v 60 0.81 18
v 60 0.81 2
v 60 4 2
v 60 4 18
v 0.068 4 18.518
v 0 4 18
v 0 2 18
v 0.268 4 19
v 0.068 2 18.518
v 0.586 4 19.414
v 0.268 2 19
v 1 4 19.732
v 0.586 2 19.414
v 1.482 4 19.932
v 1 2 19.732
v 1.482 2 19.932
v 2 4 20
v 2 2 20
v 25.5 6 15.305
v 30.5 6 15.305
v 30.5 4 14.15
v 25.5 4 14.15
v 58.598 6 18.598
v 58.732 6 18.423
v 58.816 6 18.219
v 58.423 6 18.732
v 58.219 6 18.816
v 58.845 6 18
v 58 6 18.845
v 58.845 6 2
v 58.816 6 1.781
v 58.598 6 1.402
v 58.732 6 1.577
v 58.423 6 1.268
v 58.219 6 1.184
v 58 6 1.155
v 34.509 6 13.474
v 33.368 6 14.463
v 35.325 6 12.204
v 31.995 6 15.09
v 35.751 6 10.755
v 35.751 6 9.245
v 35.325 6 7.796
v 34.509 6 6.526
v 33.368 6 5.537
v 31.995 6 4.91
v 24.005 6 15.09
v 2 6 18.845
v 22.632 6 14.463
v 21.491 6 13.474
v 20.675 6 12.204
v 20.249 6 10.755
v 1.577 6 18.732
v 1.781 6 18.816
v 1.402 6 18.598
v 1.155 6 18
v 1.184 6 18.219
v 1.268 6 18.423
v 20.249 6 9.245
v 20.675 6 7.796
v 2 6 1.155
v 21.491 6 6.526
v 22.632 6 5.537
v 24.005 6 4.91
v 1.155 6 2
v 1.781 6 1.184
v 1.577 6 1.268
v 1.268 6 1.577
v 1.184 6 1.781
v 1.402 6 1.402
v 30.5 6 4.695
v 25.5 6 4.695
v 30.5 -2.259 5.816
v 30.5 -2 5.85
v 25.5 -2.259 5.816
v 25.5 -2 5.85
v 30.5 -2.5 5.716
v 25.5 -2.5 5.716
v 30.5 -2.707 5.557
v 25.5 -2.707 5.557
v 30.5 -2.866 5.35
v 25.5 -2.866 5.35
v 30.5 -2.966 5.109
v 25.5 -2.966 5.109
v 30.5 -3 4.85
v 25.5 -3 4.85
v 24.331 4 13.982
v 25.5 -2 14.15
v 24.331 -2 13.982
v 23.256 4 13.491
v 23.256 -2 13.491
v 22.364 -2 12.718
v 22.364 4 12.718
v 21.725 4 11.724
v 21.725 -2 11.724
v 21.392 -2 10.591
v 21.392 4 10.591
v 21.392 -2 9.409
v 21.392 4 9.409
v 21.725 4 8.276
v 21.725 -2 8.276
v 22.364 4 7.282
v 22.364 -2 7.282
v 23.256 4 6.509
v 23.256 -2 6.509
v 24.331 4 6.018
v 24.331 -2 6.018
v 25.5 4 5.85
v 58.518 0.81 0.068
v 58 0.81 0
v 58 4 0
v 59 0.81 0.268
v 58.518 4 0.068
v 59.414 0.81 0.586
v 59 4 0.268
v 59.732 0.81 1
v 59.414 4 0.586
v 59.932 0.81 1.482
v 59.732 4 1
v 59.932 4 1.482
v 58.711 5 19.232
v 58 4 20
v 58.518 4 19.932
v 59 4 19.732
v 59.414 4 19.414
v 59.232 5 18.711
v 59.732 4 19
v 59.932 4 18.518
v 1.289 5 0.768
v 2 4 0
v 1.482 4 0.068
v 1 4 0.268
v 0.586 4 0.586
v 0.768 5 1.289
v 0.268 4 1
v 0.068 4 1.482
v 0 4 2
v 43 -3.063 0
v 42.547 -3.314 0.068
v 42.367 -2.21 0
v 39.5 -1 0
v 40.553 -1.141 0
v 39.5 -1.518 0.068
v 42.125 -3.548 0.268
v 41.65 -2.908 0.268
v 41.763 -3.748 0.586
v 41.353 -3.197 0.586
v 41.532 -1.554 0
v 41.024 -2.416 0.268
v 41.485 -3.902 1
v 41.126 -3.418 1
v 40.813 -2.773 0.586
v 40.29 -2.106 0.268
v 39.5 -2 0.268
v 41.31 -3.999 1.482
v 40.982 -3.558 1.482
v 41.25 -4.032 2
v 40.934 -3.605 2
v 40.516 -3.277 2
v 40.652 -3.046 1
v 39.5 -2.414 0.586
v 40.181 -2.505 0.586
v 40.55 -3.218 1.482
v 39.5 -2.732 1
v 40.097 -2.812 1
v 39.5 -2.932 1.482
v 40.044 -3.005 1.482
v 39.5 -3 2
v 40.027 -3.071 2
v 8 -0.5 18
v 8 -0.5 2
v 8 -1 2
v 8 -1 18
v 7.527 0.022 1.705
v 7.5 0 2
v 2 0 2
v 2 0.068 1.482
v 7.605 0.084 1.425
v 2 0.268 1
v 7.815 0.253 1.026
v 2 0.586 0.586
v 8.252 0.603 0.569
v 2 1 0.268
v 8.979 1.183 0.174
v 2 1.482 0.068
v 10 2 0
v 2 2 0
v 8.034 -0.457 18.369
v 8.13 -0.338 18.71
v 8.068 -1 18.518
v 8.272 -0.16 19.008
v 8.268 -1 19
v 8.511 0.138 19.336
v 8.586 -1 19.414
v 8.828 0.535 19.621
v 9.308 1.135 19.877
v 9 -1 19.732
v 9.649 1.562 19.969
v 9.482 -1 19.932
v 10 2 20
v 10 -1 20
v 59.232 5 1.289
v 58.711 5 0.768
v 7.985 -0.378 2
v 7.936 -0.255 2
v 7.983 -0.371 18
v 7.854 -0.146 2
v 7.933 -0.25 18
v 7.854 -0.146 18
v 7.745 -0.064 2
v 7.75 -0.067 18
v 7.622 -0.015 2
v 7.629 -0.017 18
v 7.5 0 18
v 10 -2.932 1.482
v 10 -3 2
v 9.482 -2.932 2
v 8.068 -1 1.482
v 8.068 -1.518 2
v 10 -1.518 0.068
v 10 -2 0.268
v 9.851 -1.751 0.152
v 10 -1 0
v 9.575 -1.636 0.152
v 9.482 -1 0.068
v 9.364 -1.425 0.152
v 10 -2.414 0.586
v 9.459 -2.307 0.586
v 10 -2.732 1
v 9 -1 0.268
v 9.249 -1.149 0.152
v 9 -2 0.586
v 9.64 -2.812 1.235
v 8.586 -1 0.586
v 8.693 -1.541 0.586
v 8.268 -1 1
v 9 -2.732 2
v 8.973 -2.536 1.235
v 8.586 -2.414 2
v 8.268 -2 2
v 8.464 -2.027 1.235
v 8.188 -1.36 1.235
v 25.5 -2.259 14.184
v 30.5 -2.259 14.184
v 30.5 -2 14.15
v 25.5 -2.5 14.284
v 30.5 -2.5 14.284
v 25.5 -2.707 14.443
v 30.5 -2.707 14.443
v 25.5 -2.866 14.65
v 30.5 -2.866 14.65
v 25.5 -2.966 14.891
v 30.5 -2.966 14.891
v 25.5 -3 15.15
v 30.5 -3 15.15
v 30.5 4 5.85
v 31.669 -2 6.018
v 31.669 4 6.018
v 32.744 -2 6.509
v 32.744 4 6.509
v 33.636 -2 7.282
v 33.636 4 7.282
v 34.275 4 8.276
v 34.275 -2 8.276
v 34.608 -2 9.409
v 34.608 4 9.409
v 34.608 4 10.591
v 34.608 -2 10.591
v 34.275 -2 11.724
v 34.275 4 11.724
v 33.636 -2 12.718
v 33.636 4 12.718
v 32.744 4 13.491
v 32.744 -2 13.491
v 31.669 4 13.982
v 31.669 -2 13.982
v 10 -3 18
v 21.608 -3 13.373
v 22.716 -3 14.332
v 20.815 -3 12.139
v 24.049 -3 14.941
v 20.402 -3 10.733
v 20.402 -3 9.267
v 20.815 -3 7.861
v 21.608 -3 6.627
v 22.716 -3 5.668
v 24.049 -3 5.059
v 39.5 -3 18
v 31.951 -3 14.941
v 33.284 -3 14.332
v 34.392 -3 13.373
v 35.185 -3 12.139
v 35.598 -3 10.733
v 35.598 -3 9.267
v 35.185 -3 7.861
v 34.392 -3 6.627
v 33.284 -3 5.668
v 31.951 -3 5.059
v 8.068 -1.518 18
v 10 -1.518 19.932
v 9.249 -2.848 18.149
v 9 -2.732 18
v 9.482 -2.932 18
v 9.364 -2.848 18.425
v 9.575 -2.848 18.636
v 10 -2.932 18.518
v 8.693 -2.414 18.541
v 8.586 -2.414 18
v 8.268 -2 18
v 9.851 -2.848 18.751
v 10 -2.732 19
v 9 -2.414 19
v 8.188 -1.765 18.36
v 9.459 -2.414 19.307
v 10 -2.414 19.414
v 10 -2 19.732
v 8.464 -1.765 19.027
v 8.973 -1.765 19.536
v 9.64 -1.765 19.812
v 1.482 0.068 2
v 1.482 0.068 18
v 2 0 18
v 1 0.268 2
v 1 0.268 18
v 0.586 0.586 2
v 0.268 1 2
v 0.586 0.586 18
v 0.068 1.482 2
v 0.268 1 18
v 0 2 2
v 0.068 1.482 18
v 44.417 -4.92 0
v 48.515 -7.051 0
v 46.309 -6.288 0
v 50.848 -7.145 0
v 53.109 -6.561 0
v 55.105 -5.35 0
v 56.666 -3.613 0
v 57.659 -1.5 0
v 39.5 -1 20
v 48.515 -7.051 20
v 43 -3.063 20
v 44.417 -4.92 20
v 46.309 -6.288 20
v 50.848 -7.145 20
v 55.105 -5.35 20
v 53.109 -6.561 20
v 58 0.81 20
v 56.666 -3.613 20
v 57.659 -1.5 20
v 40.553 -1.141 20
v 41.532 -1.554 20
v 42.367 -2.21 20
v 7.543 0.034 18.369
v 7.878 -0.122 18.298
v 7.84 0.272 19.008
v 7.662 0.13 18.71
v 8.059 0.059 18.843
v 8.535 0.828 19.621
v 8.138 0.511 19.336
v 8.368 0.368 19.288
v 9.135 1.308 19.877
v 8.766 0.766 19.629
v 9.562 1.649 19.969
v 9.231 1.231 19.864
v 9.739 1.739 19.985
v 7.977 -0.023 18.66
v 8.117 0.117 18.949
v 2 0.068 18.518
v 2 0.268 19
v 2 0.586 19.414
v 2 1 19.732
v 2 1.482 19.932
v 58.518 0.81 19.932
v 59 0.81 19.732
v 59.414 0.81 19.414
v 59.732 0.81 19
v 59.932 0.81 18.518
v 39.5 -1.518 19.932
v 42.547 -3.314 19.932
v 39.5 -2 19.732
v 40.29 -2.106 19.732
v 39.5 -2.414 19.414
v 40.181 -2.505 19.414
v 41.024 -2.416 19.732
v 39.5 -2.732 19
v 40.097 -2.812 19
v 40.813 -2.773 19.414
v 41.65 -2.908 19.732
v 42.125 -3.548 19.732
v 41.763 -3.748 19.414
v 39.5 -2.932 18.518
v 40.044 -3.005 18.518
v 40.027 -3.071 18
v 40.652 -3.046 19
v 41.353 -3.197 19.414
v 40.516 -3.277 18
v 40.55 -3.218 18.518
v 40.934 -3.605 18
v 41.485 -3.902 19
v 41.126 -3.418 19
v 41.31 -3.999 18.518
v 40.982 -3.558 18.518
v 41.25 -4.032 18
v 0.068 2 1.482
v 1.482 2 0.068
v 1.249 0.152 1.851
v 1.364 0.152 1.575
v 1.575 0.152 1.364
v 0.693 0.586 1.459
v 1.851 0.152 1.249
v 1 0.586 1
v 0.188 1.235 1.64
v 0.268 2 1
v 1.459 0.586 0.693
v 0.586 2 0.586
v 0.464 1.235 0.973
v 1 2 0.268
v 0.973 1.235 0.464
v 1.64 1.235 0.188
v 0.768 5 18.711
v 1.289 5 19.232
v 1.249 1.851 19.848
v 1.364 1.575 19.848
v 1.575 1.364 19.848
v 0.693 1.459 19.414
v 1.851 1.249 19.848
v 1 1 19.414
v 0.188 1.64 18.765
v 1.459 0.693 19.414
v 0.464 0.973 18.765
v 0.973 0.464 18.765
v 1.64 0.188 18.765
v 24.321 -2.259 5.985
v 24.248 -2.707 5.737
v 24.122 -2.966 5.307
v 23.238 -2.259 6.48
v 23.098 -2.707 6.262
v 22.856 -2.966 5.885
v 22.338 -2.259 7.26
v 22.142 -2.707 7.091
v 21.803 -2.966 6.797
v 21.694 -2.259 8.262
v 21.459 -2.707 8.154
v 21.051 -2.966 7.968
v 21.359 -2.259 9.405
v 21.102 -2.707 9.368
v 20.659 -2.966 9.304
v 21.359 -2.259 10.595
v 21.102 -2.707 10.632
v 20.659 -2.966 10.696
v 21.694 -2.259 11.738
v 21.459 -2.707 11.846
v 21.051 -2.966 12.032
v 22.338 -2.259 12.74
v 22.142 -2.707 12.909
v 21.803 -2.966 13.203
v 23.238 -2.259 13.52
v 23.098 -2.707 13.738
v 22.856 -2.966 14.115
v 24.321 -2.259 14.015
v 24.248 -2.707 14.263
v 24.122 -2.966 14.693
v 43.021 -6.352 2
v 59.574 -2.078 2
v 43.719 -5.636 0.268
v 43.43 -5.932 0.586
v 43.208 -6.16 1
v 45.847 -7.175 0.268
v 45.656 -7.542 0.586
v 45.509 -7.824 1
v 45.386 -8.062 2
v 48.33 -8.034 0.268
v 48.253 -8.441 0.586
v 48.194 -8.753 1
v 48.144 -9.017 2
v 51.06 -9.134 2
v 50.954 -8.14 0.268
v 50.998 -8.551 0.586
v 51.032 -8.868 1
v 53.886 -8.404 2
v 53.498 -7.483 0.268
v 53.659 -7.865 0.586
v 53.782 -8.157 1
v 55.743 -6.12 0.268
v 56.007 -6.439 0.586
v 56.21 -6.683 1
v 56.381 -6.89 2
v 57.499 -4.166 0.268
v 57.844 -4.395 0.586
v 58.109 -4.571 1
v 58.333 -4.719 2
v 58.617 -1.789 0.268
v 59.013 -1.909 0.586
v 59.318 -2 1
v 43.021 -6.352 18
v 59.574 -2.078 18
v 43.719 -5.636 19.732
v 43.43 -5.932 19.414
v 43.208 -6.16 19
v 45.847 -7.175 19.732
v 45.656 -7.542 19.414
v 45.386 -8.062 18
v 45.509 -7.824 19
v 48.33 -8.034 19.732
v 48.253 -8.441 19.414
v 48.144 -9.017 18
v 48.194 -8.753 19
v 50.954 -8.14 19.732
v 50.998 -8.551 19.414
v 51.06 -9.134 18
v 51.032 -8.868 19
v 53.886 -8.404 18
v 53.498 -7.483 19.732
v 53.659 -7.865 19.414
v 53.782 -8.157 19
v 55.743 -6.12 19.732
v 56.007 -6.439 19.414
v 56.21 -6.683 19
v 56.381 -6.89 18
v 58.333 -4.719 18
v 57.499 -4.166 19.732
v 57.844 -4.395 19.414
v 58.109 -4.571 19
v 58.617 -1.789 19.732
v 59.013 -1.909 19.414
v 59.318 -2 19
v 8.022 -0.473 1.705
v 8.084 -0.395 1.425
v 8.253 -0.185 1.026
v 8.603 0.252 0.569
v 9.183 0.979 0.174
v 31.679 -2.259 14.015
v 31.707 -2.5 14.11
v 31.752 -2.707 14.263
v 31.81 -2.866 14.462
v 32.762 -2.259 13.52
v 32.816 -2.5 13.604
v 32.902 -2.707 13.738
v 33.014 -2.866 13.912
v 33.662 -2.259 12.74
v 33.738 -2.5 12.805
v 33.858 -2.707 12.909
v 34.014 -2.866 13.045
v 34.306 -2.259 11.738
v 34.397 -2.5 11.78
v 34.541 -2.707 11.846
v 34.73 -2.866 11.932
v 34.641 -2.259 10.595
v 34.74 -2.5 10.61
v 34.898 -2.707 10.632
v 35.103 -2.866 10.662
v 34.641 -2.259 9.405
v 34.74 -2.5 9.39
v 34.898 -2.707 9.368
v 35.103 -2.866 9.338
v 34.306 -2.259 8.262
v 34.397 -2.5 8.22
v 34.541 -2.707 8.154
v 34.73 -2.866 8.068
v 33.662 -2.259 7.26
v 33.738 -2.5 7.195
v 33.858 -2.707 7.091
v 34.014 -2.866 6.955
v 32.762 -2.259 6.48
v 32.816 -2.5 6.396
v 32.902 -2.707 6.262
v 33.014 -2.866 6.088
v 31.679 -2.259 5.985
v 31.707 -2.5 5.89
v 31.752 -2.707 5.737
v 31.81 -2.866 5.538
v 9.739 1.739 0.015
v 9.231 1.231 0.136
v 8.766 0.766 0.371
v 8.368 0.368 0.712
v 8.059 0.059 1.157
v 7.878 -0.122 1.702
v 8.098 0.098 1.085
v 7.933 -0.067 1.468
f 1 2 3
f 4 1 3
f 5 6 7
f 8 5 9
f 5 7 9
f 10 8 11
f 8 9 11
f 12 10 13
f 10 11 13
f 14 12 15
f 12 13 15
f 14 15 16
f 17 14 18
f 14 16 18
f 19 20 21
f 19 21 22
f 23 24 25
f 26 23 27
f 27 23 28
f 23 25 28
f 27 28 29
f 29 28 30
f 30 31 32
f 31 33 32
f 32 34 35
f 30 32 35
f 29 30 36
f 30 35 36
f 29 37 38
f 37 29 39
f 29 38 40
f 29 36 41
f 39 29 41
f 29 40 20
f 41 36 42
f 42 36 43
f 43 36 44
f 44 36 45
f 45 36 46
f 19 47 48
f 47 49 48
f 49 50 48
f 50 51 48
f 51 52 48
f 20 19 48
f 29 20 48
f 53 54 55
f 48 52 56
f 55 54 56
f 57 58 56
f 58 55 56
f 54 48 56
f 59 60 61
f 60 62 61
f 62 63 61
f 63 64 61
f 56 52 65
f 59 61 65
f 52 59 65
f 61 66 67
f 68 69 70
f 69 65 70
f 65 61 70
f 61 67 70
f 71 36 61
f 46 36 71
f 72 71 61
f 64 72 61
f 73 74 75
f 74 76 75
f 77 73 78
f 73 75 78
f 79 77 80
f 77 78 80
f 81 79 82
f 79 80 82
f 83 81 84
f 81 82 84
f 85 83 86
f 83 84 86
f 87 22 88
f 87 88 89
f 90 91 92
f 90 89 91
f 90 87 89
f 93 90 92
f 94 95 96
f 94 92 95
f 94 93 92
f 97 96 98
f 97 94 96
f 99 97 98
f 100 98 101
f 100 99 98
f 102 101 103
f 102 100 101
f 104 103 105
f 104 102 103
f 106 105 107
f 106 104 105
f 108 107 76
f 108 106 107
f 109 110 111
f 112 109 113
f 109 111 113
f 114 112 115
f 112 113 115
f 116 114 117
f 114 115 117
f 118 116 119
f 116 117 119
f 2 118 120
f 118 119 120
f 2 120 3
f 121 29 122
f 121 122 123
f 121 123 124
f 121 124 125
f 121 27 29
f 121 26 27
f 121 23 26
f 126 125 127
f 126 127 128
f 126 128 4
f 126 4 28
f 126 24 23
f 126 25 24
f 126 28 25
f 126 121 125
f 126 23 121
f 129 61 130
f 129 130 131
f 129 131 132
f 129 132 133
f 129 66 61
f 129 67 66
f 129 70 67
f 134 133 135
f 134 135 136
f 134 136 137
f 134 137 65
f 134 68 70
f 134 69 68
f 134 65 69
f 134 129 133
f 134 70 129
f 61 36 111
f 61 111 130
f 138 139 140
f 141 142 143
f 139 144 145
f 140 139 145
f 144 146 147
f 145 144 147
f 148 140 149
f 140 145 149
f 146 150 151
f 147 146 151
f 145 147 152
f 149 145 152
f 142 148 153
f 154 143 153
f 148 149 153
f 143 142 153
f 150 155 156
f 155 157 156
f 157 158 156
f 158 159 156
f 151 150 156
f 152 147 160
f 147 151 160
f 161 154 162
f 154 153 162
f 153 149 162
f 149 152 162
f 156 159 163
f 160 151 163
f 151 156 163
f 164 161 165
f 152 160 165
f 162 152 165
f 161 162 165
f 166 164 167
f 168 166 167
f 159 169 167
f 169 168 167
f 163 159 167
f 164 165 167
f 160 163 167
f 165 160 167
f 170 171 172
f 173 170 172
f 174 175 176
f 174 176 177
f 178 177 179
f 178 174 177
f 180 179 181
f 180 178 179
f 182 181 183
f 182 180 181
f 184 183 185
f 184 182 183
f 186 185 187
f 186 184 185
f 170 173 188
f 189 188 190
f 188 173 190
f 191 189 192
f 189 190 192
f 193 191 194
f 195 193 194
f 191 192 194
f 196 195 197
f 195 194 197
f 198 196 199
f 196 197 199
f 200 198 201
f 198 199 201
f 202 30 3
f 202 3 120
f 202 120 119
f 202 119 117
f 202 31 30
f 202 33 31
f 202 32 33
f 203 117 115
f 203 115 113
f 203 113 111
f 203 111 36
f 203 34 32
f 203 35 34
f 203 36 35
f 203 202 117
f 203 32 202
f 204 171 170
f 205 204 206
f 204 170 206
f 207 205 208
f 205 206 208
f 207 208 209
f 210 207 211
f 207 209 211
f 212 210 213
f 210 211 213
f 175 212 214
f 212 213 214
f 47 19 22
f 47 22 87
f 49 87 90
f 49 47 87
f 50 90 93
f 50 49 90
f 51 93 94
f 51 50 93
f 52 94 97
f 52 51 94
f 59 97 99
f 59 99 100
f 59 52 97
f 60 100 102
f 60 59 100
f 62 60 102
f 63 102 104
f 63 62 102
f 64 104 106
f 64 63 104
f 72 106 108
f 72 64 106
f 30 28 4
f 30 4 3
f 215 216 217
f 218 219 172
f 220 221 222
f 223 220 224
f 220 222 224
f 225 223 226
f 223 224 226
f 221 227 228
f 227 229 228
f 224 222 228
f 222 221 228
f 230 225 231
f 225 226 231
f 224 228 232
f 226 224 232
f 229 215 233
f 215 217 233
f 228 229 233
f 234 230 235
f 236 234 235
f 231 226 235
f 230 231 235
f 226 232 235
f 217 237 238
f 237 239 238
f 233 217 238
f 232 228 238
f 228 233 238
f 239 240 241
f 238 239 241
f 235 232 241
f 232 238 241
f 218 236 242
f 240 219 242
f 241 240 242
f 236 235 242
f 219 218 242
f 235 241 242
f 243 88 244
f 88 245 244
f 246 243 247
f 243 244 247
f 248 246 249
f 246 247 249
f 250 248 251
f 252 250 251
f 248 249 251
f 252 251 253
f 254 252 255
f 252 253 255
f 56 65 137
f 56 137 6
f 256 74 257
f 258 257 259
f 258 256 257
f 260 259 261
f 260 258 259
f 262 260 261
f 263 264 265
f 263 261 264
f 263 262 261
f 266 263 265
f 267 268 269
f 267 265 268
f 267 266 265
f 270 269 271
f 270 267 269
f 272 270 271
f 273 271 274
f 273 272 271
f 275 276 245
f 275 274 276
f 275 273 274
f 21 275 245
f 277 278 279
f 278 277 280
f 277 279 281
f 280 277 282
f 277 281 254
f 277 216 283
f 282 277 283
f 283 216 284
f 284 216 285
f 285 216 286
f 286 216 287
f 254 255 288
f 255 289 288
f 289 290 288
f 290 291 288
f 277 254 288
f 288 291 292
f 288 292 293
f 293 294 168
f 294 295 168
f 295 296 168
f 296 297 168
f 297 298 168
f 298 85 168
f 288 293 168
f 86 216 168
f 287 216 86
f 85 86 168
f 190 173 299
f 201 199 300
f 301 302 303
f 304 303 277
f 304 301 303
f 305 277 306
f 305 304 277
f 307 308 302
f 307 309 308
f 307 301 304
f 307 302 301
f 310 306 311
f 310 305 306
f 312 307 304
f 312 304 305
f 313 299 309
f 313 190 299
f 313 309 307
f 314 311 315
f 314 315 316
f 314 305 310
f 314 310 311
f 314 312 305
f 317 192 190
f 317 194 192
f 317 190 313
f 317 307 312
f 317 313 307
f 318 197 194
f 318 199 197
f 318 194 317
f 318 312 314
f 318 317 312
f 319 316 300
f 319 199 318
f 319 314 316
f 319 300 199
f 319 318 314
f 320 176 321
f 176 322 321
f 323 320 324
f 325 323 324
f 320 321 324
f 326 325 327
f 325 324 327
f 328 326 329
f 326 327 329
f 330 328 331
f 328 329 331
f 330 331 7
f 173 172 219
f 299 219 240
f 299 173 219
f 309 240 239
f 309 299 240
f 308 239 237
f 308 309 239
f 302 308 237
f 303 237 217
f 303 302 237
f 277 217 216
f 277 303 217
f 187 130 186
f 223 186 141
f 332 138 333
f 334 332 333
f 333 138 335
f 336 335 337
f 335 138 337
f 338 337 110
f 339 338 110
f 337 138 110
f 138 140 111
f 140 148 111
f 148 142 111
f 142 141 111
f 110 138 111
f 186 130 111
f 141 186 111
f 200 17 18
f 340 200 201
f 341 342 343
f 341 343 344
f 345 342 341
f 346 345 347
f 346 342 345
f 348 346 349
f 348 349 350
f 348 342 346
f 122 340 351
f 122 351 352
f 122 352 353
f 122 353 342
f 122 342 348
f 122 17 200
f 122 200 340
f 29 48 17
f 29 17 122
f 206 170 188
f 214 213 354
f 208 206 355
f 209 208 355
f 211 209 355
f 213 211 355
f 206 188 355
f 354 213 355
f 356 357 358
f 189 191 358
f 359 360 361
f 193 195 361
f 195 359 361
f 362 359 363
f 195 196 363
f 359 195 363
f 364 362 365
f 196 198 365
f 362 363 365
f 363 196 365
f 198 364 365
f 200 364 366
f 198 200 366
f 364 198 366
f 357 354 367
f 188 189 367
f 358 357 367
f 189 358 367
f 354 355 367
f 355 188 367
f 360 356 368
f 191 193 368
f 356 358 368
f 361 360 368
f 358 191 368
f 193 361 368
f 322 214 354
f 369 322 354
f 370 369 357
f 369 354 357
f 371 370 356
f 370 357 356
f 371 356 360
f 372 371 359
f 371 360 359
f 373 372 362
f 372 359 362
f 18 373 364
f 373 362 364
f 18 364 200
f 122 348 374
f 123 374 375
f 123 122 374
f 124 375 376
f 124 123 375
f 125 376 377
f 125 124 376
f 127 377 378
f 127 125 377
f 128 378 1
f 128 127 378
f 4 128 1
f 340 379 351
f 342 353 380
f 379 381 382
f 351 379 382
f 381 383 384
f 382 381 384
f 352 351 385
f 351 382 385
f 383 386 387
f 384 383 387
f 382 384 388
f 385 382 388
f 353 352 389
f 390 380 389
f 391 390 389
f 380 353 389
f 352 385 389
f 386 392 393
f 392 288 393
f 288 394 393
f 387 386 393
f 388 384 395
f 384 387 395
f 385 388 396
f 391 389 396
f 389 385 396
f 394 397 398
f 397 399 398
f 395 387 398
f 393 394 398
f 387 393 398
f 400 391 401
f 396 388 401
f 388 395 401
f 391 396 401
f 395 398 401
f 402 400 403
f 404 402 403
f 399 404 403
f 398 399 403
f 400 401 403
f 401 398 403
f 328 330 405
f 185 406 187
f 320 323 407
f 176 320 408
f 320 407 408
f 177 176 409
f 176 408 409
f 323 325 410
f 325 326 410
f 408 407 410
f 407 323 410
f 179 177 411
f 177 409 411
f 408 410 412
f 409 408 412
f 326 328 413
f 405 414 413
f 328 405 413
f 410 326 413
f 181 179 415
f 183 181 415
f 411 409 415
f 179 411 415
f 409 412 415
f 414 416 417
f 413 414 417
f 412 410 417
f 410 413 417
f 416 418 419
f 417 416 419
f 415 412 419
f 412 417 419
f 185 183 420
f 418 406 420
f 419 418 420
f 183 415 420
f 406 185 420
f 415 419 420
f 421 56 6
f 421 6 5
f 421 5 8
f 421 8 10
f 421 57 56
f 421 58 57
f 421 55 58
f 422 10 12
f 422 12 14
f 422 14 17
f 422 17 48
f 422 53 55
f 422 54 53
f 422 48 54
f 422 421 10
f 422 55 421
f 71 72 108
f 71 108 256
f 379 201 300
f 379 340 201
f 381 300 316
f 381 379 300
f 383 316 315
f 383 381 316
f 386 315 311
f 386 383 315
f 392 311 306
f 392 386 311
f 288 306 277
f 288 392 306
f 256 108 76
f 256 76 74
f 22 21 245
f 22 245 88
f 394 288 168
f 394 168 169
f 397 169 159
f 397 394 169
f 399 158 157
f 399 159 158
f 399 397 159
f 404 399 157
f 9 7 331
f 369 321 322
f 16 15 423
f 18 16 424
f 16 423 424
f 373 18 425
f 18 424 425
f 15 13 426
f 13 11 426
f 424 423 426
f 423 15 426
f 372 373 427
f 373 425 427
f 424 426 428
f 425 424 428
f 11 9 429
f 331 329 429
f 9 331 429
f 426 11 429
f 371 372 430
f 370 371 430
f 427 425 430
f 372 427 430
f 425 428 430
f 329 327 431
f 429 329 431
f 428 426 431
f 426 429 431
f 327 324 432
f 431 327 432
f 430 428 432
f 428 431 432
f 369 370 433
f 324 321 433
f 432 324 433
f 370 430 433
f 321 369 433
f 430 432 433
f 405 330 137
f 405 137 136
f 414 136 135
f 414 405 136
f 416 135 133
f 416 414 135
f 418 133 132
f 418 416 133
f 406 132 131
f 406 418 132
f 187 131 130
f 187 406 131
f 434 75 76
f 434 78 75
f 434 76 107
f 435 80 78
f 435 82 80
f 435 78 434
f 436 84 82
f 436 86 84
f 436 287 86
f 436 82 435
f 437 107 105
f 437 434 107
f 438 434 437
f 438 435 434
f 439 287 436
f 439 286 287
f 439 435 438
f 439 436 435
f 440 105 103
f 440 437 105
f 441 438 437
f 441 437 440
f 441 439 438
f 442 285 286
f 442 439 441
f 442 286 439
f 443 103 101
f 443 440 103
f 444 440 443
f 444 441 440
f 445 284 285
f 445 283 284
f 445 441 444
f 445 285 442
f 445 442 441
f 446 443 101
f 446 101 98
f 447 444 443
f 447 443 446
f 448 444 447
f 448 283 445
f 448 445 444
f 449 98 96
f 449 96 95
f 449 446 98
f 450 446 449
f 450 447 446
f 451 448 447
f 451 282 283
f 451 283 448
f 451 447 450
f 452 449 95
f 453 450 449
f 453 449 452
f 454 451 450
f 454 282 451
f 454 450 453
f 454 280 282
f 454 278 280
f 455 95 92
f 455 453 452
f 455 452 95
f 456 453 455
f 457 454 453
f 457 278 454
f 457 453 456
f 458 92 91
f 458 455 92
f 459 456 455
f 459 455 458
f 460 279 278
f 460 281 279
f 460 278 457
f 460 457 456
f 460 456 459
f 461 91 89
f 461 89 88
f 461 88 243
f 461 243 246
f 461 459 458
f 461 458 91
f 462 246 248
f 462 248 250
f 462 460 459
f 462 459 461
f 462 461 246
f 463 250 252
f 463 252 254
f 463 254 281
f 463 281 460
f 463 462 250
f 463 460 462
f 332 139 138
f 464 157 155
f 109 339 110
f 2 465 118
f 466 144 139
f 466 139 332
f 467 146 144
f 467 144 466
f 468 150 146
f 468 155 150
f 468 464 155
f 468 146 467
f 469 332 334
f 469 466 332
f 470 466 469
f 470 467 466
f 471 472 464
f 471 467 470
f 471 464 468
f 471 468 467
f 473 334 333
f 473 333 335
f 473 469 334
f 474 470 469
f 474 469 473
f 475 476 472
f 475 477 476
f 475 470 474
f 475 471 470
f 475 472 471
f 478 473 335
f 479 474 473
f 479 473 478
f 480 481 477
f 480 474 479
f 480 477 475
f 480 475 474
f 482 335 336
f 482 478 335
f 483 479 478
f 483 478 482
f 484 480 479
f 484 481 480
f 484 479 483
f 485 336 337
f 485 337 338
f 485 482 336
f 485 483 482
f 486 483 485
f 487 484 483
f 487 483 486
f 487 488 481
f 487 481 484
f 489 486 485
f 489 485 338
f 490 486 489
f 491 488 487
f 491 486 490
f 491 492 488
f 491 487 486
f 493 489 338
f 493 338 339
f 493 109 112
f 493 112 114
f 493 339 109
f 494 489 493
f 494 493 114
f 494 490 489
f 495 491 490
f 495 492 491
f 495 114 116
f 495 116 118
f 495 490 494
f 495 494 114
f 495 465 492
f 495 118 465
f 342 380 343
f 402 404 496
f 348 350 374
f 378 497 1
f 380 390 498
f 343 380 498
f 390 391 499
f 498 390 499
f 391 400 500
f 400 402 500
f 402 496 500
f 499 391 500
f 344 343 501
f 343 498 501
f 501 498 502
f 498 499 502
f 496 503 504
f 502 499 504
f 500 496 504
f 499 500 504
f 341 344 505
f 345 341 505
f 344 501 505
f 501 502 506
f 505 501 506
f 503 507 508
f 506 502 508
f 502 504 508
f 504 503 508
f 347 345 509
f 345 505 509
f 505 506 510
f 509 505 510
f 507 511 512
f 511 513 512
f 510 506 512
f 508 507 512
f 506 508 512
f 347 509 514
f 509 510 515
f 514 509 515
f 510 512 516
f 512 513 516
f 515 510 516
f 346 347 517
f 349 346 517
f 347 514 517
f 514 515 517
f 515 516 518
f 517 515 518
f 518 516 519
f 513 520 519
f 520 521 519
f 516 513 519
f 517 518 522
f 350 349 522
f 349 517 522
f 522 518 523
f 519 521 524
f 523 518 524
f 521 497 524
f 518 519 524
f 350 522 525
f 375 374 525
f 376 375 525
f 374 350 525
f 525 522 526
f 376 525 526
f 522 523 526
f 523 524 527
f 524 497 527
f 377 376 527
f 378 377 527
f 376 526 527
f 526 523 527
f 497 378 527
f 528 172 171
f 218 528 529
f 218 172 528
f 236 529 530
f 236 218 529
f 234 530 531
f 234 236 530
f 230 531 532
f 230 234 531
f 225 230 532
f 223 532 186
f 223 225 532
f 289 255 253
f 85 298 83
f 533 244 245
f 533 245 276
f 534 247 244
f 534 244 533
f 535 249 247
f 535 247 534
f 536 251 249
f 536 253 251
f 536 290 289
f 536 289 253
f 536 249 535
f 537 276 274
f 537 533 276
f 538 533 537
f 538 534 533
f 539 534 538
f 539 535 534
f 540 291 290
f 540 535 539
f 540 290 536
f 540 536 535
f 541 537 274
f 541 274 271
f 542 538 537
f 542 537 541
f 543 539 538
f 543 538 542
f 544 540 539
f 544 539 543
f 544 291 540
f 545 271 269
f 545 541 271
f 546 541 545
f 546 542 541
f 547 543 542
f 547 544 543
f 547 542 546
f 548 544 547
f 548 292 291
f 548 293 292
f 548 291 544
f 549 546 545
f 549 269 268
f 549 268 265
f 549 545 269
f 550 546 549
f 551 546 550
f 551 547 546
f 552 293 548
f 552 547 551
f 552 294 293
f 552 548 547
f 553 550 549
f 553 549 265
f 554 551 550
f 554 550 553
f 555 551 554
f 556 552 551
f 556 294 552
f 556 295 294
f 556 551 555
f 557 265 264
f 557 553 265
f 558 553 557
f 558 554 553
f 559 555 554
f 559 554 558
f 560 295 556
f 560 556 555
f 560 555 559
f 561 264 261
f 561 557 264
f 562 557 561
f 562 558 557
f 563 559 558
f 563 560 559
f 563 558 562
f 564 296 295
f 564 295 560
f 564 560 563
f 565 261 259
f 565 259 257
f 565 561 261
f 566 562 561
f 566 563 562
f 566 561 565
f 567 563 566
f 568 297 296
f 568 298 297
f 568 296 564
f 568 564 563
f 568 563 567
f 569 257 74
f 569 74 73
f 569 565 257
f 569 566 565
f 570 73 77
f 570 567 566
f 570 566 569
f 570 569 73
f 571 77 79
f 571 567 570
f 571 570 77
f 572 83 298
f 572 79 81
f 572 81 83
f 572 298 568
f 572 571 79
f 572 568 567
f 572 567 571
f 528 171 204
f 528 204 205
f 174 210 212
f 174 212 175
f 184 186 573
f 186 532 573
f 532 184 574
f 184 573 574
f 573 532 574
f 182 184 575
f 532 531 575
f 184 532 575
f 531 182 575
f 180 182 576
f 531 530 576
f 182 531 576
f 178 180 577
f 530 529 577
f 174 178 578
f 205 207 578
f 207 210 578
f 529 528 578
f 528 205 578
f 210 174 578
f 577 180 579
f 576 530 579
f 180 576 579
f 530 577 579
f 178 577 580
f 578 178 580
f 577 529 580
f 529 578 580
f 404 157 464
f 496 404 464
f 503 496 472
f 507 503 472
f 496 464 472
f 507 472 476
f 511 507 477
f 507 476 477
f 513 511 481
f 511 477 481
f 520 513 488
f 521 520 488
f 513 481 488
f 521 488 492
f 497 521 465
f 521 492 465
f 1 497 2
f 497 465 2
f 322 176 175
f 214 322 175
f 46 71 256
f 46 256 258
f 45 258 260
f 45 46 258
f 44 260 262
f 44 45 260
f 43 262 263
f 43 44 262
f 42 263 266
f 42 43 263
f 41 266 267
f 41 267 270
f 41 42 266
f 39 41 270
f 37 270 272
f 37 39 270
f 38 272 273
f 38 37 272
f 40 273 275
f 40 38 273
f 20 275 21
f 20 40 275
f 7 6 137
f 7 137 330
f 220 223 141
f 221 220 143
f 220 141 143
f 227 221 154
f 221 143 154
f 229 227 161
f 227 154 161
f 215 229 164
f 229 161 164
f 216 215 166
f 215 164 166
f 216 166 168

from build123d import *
from OCP.BRepFilletAPI import BRepFilletAPI_MakeChamfer

# Parameters (mm, degrees)
BOSS_EXTRUDE1_DEPTH = 20
CUT_EXTRUDE1_REACH  = 67.044
FILLET1_R           = 2
CHAMFER1_SIZE       = 2
CHAMFER1_SIZE2      = 1.154700538
CHAMFER2_SIZE       = 2
CHAMFER2_SIZE2      = 1.154700538
FILLET2_R           = 1
FILLET3_R           = 0.5


with BuildPart() as part:
    # Sketch1 → Boss-Extrude1 (new body)
    with BuildSketch(Plane.XY):
        with BuildLine():
            Line((0, 0), (8, 0))
            Line((8, 0), (8, -3))
            Line((8, -3), (40.754109963, -3))
            ThreePointArc((40.754109963, -3), (51.941790363, -9), (60, 0.809661064))
            Line((60, 0.809661064), (60, 6))
            Line((60, 6), (0, 6))
            Line((0, 6), (0, 0))
        make_face()
    extrude(amount=BOSS_EXTRUDE1_DEPTH)

    # Sketch2 → Cut-Extrude1 (cut, up to next)
    with BuildSketch(Plane(origin=(0, 6, 0), x_dir=(1, 0, 0), z_dir=(0, 1, 0)), mode=Mode.PRIVATE) as cut_extrude1_sk1:
        with BuildLine():
            Line((25.5, -5.85), (30.5, -5.85))
            ThreePointArc((30.5, -5.85), (34.65, -10), (30.5, -14.15))
            Line((30.5, -14.15), (25.5, -14.15))
            ThreePointArc((25.5, -14.15), (21.35, -10), (25.5, -5.85))
        make_face()
    cut_extrude1_tool1 = extrude(cut_extrude1_sk1.sketch, amount=-CUT_EXTRUDE1_REACH, mode=Mode.PRIVATE) & part.part
    add(cut_extrude1_tool1.solids().sort_by_distance((28, 6, 10))[0], mode=Mode.SUBTRACT)

    # Fillet1
    fillet1_edges = [part.edges().sort_by_distance(p)[0] for p in [
        (0, 3, 0),
        (8, -1.5, 20),
        (40.754109963, -3, 10),
        (8, -3, 10),
        (0, 0, 10),
        (24.377054981, -3, 20),
        (51.941790363, -9, 20),
        (60, 3.404830532, 20),
        (0, 3, 20),
        (60, 3.404830532, 0),
        (51.941790363, -9, 0),
        (24.377054981, -3, 0),
        (4, 0, 20),
        (8, -1.5, 0),
        (4, 0, 0),
    ]]
    fillet(fillet1_edges, radius=FILLET1_R)

    # Chamfer1: one chamfer whose edges measure the first distance from different faces: ONE call of the kernel's chamfer builder (chamfer() names one face for all edges)
    chamfer1_edges_1 = [part.edges().sort_by_distance(p)[0] for p in [
        (30, 6, 0),
    ]]
    chamfer1_side_1 = [part.faces().sort_by_distance(p)[0] for p in [
        (34.587898507, 1.608386823, 0),
    ]]
    chamfer1_edges_2 = [part.edges().sort_by_distance(p)[0] for p in [
        (30, 6, 20),
    ]]
    chamfer1_side_2 = [part.faces().sort_by_distance(p)[0] for p in [
        (34.587898507, 1.608386823, 20),
    ]]
    chamfer1_edges_3 = [part.edges().sort_by_distance(p)[0] for p in [
        (60, 6, 10),
    ]]
    chamfer1_side_3 = [part.faces().sort_by_distance(p)[0] for p in [
        (60, 3.404830532, 10),
    ]]
    chamfer1_edges_4 = [part.edges().sort_by_distance(p)[0] for p in [
        (0, 6, 10),
    ]]
    chamfer1_side_4 = [part.faces().sort_by_distance(p)[0] for p in [
        (0, 4, 10),
    ]]
    chamfer1_edges_5 = [part.edges().sort_by_distance(p)[0] for p in [
        (0.585786438, 6, 19.414213562),
    ]]
    chamfer1_side_5 = [part.faces().sort_by_distance(p)[0] for p in [
        (0.585786438, 4, 19.414213562),
    ]]
    chamfer1_edges_6 = [part.edges().sort_by_distance(p)[0] for p in [
        (0.585786438, 6, 0.585786438),
    ]]
    chamfer1_side_6 = [part.faces().sort_by_distance(p)[0] for p in [
        (0.585786438, 4, 0.585786438),
    ]]
    chamfer1_edges_7 = [part.edges().sort_by_distance(p)[0] for p in [
        (59.414213562, 6, 19.414213562),
    ]]
    chamfer1_side_7 = [part.faces().sort_by_distance(p)[0] for p in [
        (59.414213562, 3.404830532, 19.414213562),
    ]]
    chamfer1_edges_8 = [part.edges().sort_by_distance(p)[0] for p in [
        (59.414213562, 6, 0.585786438),
    ]]
    chamfer1_side_8 = [part.faces().sort_by_distance(p)[0] for p in [
        (59.414213562, 3.404830532, 0.585786438),
    ]]
    chamfer1 = BRepFilletAPI_MakeChamfer(part.part.solid().wrapped)
    for e in chamfer1_edges_1:
        chamfer1.Add(CHAMFER1_SIZE, CHAMFER1_SIZE2, e.wrapped, chamfer1_side_1[0].wrapped)  # the first distance lies on this face
    for e in chamfer1_edges_2:
        chamfer1.Add(CHAMFER1_SIZE, CHAMFER1_SIZE2, e.wrapped, chamfer1_side_2[0].wrapped)  # the first distance lies on this face
    for e in chamfer1_edges_3:
        chamfer1.Add(CHAMFER1_SIZE, CHAMFER1_SIZE2, e.wrapped, chamfer1_side_3[0].wrapped)  # the first distance lies on this face
    for e in chamfer1_edges_4:
        chamfer1.Add(CHAMFER1_SIZE, CHAMFER1_SIZE2, e.wrapped, chamfer1_side_4[0].wrapped)  # the first distance lies on this face
    for e in chamfer1_edges_5:
        chamfer1.Add(CHAMFER1_SIZE, CHAMFER1_SIZE2, e.wrapped, chamfer1_side_5[0].wrapped)  # the first distance lies on this face
    for e in chamfer1_edges_6:
        chamfer1.Add(CHAMFER1_SIZE, CHAMFER1_SIZE2, e.wrapped, chamfer1_side_6[0].wrapped)  # the first distance lies on this face
    for e in chamfer1_edges_7:
        chamfer1.Add(CHAMFER1_SIZE, CHAMFER1_SIZE2, e.wrapped, chamfer1_side_7[0].wrapped)  # the first distance lies on this face
    for e in chamfer1_edges_8:
        chamfer1.Add(CHAMFER1_SIZE, CHAMFER1_SIZE2, e.wrapped, chamfer1_side_8[0].wrapped)  # the first distance lies on this face
    add(Compound.cast(chamfer1.Shape()), mode=Mode.REPLACE)

    # Chamfer2: one chamfer whose edges measure the first distance from different faces: ONE call of the kernel's chamfer builder (chamfer() names one face for all edges)
    chamfer2_edges_1 = [part.edges().sort_by_distance(p)[0] for p in [
        (21.35, 6, 10),
    ]]
    chamfer2_side_1 = [part.faces().sort_by_distance(p)[0] for p in [
        (21.35, 1.5, 10),
    ]]
    chamfer2_edges_2 = [part.edges().sort_by_distance(p)[0] for p in [
        (28, 6, 14.15),
    ]]
    chamfer2_side_2 = [part.faces().sort_by_distance(p)[0] for p in [
        (28, 1.5, 14.15),
    ]]
    chamfer2_edges_3 = [part.edges().sort_by_distance(p)[0] for p in [
        (34.65, 6, 10),
    ]]
    chamfer2_side_3 = [part.faces().sort_by_distance(p)[0] for p in [
        (34.65, 1.5, 10),
    ]]
    chamfer2_edges_4 = [part.edges().sort_by_distance(p)[0] for p in [
        (28, 6, 5.85),
    ]]
    chamfer2_side_4 = [part.faces().sort_by_distance(p)[0] for p in [
        (28, 1.5, 5.85),
    ]]
    chamfer2 = BRepFilletAPI_MakeChamfer(part.part.solid().wrapped)
    for e in chamfer2_edges_1:
        chamfer2.Add(CHAMFER2_SIZE, CHAMFER2_SIZE2, e.wrapped, chamfer2_side_1[0].wrapped)  # the first distance lies on this face
    for e in chamfer2_edges_2:
        chamfer2.Add(CHAMFER2_SIZE, CHAMFER2_SIZE2, e.wrapped, chamfer2_side_2[0].wrapped)  # the first distance lies on this face
    for e in chamfer2_edges_3:
        chamfer2.Add(CHAMFER2_SIZE, CHAMFER2_SIZE2, e.wrapped, chamfer2_side_3[0].wrapped)  # the first distance lies on this face
    for e in chamfer2_edges_4:
        chamfer2.Add(CHAMFER2_SIZE, CHAMFER2_SIZE2, e.wrapped, chamfer2_side_4[0].wrapped)  # the first distance lies on this face
    add(Compound.cast(chamfer2.Shape()), mode=Mode.REPLACE)

    # Fillet2
    fillet2_edges = [part.edges().sort_by_distance(p)[0] for p in [
        (28, -3, 14.15),
        (21.35, -3, 10),
        (28, -3, 5.85),
        (34.65, -3, 10),
    ]]
    fillet(fillet2_edges, radius=FILLET2_R)

    # Fillet3
    fillet3_edges = [part.edges().sort_by_distance(p)[0] for p in [
        (8, 0, 10),
        (8.707902185, 0.707902185, 19.526592034),
        (8.707902185, 0.707902185, 0.473407966),
    ]]
    fillet(fillet3_edges, radius=FILLET3_R)


solid = part.part
